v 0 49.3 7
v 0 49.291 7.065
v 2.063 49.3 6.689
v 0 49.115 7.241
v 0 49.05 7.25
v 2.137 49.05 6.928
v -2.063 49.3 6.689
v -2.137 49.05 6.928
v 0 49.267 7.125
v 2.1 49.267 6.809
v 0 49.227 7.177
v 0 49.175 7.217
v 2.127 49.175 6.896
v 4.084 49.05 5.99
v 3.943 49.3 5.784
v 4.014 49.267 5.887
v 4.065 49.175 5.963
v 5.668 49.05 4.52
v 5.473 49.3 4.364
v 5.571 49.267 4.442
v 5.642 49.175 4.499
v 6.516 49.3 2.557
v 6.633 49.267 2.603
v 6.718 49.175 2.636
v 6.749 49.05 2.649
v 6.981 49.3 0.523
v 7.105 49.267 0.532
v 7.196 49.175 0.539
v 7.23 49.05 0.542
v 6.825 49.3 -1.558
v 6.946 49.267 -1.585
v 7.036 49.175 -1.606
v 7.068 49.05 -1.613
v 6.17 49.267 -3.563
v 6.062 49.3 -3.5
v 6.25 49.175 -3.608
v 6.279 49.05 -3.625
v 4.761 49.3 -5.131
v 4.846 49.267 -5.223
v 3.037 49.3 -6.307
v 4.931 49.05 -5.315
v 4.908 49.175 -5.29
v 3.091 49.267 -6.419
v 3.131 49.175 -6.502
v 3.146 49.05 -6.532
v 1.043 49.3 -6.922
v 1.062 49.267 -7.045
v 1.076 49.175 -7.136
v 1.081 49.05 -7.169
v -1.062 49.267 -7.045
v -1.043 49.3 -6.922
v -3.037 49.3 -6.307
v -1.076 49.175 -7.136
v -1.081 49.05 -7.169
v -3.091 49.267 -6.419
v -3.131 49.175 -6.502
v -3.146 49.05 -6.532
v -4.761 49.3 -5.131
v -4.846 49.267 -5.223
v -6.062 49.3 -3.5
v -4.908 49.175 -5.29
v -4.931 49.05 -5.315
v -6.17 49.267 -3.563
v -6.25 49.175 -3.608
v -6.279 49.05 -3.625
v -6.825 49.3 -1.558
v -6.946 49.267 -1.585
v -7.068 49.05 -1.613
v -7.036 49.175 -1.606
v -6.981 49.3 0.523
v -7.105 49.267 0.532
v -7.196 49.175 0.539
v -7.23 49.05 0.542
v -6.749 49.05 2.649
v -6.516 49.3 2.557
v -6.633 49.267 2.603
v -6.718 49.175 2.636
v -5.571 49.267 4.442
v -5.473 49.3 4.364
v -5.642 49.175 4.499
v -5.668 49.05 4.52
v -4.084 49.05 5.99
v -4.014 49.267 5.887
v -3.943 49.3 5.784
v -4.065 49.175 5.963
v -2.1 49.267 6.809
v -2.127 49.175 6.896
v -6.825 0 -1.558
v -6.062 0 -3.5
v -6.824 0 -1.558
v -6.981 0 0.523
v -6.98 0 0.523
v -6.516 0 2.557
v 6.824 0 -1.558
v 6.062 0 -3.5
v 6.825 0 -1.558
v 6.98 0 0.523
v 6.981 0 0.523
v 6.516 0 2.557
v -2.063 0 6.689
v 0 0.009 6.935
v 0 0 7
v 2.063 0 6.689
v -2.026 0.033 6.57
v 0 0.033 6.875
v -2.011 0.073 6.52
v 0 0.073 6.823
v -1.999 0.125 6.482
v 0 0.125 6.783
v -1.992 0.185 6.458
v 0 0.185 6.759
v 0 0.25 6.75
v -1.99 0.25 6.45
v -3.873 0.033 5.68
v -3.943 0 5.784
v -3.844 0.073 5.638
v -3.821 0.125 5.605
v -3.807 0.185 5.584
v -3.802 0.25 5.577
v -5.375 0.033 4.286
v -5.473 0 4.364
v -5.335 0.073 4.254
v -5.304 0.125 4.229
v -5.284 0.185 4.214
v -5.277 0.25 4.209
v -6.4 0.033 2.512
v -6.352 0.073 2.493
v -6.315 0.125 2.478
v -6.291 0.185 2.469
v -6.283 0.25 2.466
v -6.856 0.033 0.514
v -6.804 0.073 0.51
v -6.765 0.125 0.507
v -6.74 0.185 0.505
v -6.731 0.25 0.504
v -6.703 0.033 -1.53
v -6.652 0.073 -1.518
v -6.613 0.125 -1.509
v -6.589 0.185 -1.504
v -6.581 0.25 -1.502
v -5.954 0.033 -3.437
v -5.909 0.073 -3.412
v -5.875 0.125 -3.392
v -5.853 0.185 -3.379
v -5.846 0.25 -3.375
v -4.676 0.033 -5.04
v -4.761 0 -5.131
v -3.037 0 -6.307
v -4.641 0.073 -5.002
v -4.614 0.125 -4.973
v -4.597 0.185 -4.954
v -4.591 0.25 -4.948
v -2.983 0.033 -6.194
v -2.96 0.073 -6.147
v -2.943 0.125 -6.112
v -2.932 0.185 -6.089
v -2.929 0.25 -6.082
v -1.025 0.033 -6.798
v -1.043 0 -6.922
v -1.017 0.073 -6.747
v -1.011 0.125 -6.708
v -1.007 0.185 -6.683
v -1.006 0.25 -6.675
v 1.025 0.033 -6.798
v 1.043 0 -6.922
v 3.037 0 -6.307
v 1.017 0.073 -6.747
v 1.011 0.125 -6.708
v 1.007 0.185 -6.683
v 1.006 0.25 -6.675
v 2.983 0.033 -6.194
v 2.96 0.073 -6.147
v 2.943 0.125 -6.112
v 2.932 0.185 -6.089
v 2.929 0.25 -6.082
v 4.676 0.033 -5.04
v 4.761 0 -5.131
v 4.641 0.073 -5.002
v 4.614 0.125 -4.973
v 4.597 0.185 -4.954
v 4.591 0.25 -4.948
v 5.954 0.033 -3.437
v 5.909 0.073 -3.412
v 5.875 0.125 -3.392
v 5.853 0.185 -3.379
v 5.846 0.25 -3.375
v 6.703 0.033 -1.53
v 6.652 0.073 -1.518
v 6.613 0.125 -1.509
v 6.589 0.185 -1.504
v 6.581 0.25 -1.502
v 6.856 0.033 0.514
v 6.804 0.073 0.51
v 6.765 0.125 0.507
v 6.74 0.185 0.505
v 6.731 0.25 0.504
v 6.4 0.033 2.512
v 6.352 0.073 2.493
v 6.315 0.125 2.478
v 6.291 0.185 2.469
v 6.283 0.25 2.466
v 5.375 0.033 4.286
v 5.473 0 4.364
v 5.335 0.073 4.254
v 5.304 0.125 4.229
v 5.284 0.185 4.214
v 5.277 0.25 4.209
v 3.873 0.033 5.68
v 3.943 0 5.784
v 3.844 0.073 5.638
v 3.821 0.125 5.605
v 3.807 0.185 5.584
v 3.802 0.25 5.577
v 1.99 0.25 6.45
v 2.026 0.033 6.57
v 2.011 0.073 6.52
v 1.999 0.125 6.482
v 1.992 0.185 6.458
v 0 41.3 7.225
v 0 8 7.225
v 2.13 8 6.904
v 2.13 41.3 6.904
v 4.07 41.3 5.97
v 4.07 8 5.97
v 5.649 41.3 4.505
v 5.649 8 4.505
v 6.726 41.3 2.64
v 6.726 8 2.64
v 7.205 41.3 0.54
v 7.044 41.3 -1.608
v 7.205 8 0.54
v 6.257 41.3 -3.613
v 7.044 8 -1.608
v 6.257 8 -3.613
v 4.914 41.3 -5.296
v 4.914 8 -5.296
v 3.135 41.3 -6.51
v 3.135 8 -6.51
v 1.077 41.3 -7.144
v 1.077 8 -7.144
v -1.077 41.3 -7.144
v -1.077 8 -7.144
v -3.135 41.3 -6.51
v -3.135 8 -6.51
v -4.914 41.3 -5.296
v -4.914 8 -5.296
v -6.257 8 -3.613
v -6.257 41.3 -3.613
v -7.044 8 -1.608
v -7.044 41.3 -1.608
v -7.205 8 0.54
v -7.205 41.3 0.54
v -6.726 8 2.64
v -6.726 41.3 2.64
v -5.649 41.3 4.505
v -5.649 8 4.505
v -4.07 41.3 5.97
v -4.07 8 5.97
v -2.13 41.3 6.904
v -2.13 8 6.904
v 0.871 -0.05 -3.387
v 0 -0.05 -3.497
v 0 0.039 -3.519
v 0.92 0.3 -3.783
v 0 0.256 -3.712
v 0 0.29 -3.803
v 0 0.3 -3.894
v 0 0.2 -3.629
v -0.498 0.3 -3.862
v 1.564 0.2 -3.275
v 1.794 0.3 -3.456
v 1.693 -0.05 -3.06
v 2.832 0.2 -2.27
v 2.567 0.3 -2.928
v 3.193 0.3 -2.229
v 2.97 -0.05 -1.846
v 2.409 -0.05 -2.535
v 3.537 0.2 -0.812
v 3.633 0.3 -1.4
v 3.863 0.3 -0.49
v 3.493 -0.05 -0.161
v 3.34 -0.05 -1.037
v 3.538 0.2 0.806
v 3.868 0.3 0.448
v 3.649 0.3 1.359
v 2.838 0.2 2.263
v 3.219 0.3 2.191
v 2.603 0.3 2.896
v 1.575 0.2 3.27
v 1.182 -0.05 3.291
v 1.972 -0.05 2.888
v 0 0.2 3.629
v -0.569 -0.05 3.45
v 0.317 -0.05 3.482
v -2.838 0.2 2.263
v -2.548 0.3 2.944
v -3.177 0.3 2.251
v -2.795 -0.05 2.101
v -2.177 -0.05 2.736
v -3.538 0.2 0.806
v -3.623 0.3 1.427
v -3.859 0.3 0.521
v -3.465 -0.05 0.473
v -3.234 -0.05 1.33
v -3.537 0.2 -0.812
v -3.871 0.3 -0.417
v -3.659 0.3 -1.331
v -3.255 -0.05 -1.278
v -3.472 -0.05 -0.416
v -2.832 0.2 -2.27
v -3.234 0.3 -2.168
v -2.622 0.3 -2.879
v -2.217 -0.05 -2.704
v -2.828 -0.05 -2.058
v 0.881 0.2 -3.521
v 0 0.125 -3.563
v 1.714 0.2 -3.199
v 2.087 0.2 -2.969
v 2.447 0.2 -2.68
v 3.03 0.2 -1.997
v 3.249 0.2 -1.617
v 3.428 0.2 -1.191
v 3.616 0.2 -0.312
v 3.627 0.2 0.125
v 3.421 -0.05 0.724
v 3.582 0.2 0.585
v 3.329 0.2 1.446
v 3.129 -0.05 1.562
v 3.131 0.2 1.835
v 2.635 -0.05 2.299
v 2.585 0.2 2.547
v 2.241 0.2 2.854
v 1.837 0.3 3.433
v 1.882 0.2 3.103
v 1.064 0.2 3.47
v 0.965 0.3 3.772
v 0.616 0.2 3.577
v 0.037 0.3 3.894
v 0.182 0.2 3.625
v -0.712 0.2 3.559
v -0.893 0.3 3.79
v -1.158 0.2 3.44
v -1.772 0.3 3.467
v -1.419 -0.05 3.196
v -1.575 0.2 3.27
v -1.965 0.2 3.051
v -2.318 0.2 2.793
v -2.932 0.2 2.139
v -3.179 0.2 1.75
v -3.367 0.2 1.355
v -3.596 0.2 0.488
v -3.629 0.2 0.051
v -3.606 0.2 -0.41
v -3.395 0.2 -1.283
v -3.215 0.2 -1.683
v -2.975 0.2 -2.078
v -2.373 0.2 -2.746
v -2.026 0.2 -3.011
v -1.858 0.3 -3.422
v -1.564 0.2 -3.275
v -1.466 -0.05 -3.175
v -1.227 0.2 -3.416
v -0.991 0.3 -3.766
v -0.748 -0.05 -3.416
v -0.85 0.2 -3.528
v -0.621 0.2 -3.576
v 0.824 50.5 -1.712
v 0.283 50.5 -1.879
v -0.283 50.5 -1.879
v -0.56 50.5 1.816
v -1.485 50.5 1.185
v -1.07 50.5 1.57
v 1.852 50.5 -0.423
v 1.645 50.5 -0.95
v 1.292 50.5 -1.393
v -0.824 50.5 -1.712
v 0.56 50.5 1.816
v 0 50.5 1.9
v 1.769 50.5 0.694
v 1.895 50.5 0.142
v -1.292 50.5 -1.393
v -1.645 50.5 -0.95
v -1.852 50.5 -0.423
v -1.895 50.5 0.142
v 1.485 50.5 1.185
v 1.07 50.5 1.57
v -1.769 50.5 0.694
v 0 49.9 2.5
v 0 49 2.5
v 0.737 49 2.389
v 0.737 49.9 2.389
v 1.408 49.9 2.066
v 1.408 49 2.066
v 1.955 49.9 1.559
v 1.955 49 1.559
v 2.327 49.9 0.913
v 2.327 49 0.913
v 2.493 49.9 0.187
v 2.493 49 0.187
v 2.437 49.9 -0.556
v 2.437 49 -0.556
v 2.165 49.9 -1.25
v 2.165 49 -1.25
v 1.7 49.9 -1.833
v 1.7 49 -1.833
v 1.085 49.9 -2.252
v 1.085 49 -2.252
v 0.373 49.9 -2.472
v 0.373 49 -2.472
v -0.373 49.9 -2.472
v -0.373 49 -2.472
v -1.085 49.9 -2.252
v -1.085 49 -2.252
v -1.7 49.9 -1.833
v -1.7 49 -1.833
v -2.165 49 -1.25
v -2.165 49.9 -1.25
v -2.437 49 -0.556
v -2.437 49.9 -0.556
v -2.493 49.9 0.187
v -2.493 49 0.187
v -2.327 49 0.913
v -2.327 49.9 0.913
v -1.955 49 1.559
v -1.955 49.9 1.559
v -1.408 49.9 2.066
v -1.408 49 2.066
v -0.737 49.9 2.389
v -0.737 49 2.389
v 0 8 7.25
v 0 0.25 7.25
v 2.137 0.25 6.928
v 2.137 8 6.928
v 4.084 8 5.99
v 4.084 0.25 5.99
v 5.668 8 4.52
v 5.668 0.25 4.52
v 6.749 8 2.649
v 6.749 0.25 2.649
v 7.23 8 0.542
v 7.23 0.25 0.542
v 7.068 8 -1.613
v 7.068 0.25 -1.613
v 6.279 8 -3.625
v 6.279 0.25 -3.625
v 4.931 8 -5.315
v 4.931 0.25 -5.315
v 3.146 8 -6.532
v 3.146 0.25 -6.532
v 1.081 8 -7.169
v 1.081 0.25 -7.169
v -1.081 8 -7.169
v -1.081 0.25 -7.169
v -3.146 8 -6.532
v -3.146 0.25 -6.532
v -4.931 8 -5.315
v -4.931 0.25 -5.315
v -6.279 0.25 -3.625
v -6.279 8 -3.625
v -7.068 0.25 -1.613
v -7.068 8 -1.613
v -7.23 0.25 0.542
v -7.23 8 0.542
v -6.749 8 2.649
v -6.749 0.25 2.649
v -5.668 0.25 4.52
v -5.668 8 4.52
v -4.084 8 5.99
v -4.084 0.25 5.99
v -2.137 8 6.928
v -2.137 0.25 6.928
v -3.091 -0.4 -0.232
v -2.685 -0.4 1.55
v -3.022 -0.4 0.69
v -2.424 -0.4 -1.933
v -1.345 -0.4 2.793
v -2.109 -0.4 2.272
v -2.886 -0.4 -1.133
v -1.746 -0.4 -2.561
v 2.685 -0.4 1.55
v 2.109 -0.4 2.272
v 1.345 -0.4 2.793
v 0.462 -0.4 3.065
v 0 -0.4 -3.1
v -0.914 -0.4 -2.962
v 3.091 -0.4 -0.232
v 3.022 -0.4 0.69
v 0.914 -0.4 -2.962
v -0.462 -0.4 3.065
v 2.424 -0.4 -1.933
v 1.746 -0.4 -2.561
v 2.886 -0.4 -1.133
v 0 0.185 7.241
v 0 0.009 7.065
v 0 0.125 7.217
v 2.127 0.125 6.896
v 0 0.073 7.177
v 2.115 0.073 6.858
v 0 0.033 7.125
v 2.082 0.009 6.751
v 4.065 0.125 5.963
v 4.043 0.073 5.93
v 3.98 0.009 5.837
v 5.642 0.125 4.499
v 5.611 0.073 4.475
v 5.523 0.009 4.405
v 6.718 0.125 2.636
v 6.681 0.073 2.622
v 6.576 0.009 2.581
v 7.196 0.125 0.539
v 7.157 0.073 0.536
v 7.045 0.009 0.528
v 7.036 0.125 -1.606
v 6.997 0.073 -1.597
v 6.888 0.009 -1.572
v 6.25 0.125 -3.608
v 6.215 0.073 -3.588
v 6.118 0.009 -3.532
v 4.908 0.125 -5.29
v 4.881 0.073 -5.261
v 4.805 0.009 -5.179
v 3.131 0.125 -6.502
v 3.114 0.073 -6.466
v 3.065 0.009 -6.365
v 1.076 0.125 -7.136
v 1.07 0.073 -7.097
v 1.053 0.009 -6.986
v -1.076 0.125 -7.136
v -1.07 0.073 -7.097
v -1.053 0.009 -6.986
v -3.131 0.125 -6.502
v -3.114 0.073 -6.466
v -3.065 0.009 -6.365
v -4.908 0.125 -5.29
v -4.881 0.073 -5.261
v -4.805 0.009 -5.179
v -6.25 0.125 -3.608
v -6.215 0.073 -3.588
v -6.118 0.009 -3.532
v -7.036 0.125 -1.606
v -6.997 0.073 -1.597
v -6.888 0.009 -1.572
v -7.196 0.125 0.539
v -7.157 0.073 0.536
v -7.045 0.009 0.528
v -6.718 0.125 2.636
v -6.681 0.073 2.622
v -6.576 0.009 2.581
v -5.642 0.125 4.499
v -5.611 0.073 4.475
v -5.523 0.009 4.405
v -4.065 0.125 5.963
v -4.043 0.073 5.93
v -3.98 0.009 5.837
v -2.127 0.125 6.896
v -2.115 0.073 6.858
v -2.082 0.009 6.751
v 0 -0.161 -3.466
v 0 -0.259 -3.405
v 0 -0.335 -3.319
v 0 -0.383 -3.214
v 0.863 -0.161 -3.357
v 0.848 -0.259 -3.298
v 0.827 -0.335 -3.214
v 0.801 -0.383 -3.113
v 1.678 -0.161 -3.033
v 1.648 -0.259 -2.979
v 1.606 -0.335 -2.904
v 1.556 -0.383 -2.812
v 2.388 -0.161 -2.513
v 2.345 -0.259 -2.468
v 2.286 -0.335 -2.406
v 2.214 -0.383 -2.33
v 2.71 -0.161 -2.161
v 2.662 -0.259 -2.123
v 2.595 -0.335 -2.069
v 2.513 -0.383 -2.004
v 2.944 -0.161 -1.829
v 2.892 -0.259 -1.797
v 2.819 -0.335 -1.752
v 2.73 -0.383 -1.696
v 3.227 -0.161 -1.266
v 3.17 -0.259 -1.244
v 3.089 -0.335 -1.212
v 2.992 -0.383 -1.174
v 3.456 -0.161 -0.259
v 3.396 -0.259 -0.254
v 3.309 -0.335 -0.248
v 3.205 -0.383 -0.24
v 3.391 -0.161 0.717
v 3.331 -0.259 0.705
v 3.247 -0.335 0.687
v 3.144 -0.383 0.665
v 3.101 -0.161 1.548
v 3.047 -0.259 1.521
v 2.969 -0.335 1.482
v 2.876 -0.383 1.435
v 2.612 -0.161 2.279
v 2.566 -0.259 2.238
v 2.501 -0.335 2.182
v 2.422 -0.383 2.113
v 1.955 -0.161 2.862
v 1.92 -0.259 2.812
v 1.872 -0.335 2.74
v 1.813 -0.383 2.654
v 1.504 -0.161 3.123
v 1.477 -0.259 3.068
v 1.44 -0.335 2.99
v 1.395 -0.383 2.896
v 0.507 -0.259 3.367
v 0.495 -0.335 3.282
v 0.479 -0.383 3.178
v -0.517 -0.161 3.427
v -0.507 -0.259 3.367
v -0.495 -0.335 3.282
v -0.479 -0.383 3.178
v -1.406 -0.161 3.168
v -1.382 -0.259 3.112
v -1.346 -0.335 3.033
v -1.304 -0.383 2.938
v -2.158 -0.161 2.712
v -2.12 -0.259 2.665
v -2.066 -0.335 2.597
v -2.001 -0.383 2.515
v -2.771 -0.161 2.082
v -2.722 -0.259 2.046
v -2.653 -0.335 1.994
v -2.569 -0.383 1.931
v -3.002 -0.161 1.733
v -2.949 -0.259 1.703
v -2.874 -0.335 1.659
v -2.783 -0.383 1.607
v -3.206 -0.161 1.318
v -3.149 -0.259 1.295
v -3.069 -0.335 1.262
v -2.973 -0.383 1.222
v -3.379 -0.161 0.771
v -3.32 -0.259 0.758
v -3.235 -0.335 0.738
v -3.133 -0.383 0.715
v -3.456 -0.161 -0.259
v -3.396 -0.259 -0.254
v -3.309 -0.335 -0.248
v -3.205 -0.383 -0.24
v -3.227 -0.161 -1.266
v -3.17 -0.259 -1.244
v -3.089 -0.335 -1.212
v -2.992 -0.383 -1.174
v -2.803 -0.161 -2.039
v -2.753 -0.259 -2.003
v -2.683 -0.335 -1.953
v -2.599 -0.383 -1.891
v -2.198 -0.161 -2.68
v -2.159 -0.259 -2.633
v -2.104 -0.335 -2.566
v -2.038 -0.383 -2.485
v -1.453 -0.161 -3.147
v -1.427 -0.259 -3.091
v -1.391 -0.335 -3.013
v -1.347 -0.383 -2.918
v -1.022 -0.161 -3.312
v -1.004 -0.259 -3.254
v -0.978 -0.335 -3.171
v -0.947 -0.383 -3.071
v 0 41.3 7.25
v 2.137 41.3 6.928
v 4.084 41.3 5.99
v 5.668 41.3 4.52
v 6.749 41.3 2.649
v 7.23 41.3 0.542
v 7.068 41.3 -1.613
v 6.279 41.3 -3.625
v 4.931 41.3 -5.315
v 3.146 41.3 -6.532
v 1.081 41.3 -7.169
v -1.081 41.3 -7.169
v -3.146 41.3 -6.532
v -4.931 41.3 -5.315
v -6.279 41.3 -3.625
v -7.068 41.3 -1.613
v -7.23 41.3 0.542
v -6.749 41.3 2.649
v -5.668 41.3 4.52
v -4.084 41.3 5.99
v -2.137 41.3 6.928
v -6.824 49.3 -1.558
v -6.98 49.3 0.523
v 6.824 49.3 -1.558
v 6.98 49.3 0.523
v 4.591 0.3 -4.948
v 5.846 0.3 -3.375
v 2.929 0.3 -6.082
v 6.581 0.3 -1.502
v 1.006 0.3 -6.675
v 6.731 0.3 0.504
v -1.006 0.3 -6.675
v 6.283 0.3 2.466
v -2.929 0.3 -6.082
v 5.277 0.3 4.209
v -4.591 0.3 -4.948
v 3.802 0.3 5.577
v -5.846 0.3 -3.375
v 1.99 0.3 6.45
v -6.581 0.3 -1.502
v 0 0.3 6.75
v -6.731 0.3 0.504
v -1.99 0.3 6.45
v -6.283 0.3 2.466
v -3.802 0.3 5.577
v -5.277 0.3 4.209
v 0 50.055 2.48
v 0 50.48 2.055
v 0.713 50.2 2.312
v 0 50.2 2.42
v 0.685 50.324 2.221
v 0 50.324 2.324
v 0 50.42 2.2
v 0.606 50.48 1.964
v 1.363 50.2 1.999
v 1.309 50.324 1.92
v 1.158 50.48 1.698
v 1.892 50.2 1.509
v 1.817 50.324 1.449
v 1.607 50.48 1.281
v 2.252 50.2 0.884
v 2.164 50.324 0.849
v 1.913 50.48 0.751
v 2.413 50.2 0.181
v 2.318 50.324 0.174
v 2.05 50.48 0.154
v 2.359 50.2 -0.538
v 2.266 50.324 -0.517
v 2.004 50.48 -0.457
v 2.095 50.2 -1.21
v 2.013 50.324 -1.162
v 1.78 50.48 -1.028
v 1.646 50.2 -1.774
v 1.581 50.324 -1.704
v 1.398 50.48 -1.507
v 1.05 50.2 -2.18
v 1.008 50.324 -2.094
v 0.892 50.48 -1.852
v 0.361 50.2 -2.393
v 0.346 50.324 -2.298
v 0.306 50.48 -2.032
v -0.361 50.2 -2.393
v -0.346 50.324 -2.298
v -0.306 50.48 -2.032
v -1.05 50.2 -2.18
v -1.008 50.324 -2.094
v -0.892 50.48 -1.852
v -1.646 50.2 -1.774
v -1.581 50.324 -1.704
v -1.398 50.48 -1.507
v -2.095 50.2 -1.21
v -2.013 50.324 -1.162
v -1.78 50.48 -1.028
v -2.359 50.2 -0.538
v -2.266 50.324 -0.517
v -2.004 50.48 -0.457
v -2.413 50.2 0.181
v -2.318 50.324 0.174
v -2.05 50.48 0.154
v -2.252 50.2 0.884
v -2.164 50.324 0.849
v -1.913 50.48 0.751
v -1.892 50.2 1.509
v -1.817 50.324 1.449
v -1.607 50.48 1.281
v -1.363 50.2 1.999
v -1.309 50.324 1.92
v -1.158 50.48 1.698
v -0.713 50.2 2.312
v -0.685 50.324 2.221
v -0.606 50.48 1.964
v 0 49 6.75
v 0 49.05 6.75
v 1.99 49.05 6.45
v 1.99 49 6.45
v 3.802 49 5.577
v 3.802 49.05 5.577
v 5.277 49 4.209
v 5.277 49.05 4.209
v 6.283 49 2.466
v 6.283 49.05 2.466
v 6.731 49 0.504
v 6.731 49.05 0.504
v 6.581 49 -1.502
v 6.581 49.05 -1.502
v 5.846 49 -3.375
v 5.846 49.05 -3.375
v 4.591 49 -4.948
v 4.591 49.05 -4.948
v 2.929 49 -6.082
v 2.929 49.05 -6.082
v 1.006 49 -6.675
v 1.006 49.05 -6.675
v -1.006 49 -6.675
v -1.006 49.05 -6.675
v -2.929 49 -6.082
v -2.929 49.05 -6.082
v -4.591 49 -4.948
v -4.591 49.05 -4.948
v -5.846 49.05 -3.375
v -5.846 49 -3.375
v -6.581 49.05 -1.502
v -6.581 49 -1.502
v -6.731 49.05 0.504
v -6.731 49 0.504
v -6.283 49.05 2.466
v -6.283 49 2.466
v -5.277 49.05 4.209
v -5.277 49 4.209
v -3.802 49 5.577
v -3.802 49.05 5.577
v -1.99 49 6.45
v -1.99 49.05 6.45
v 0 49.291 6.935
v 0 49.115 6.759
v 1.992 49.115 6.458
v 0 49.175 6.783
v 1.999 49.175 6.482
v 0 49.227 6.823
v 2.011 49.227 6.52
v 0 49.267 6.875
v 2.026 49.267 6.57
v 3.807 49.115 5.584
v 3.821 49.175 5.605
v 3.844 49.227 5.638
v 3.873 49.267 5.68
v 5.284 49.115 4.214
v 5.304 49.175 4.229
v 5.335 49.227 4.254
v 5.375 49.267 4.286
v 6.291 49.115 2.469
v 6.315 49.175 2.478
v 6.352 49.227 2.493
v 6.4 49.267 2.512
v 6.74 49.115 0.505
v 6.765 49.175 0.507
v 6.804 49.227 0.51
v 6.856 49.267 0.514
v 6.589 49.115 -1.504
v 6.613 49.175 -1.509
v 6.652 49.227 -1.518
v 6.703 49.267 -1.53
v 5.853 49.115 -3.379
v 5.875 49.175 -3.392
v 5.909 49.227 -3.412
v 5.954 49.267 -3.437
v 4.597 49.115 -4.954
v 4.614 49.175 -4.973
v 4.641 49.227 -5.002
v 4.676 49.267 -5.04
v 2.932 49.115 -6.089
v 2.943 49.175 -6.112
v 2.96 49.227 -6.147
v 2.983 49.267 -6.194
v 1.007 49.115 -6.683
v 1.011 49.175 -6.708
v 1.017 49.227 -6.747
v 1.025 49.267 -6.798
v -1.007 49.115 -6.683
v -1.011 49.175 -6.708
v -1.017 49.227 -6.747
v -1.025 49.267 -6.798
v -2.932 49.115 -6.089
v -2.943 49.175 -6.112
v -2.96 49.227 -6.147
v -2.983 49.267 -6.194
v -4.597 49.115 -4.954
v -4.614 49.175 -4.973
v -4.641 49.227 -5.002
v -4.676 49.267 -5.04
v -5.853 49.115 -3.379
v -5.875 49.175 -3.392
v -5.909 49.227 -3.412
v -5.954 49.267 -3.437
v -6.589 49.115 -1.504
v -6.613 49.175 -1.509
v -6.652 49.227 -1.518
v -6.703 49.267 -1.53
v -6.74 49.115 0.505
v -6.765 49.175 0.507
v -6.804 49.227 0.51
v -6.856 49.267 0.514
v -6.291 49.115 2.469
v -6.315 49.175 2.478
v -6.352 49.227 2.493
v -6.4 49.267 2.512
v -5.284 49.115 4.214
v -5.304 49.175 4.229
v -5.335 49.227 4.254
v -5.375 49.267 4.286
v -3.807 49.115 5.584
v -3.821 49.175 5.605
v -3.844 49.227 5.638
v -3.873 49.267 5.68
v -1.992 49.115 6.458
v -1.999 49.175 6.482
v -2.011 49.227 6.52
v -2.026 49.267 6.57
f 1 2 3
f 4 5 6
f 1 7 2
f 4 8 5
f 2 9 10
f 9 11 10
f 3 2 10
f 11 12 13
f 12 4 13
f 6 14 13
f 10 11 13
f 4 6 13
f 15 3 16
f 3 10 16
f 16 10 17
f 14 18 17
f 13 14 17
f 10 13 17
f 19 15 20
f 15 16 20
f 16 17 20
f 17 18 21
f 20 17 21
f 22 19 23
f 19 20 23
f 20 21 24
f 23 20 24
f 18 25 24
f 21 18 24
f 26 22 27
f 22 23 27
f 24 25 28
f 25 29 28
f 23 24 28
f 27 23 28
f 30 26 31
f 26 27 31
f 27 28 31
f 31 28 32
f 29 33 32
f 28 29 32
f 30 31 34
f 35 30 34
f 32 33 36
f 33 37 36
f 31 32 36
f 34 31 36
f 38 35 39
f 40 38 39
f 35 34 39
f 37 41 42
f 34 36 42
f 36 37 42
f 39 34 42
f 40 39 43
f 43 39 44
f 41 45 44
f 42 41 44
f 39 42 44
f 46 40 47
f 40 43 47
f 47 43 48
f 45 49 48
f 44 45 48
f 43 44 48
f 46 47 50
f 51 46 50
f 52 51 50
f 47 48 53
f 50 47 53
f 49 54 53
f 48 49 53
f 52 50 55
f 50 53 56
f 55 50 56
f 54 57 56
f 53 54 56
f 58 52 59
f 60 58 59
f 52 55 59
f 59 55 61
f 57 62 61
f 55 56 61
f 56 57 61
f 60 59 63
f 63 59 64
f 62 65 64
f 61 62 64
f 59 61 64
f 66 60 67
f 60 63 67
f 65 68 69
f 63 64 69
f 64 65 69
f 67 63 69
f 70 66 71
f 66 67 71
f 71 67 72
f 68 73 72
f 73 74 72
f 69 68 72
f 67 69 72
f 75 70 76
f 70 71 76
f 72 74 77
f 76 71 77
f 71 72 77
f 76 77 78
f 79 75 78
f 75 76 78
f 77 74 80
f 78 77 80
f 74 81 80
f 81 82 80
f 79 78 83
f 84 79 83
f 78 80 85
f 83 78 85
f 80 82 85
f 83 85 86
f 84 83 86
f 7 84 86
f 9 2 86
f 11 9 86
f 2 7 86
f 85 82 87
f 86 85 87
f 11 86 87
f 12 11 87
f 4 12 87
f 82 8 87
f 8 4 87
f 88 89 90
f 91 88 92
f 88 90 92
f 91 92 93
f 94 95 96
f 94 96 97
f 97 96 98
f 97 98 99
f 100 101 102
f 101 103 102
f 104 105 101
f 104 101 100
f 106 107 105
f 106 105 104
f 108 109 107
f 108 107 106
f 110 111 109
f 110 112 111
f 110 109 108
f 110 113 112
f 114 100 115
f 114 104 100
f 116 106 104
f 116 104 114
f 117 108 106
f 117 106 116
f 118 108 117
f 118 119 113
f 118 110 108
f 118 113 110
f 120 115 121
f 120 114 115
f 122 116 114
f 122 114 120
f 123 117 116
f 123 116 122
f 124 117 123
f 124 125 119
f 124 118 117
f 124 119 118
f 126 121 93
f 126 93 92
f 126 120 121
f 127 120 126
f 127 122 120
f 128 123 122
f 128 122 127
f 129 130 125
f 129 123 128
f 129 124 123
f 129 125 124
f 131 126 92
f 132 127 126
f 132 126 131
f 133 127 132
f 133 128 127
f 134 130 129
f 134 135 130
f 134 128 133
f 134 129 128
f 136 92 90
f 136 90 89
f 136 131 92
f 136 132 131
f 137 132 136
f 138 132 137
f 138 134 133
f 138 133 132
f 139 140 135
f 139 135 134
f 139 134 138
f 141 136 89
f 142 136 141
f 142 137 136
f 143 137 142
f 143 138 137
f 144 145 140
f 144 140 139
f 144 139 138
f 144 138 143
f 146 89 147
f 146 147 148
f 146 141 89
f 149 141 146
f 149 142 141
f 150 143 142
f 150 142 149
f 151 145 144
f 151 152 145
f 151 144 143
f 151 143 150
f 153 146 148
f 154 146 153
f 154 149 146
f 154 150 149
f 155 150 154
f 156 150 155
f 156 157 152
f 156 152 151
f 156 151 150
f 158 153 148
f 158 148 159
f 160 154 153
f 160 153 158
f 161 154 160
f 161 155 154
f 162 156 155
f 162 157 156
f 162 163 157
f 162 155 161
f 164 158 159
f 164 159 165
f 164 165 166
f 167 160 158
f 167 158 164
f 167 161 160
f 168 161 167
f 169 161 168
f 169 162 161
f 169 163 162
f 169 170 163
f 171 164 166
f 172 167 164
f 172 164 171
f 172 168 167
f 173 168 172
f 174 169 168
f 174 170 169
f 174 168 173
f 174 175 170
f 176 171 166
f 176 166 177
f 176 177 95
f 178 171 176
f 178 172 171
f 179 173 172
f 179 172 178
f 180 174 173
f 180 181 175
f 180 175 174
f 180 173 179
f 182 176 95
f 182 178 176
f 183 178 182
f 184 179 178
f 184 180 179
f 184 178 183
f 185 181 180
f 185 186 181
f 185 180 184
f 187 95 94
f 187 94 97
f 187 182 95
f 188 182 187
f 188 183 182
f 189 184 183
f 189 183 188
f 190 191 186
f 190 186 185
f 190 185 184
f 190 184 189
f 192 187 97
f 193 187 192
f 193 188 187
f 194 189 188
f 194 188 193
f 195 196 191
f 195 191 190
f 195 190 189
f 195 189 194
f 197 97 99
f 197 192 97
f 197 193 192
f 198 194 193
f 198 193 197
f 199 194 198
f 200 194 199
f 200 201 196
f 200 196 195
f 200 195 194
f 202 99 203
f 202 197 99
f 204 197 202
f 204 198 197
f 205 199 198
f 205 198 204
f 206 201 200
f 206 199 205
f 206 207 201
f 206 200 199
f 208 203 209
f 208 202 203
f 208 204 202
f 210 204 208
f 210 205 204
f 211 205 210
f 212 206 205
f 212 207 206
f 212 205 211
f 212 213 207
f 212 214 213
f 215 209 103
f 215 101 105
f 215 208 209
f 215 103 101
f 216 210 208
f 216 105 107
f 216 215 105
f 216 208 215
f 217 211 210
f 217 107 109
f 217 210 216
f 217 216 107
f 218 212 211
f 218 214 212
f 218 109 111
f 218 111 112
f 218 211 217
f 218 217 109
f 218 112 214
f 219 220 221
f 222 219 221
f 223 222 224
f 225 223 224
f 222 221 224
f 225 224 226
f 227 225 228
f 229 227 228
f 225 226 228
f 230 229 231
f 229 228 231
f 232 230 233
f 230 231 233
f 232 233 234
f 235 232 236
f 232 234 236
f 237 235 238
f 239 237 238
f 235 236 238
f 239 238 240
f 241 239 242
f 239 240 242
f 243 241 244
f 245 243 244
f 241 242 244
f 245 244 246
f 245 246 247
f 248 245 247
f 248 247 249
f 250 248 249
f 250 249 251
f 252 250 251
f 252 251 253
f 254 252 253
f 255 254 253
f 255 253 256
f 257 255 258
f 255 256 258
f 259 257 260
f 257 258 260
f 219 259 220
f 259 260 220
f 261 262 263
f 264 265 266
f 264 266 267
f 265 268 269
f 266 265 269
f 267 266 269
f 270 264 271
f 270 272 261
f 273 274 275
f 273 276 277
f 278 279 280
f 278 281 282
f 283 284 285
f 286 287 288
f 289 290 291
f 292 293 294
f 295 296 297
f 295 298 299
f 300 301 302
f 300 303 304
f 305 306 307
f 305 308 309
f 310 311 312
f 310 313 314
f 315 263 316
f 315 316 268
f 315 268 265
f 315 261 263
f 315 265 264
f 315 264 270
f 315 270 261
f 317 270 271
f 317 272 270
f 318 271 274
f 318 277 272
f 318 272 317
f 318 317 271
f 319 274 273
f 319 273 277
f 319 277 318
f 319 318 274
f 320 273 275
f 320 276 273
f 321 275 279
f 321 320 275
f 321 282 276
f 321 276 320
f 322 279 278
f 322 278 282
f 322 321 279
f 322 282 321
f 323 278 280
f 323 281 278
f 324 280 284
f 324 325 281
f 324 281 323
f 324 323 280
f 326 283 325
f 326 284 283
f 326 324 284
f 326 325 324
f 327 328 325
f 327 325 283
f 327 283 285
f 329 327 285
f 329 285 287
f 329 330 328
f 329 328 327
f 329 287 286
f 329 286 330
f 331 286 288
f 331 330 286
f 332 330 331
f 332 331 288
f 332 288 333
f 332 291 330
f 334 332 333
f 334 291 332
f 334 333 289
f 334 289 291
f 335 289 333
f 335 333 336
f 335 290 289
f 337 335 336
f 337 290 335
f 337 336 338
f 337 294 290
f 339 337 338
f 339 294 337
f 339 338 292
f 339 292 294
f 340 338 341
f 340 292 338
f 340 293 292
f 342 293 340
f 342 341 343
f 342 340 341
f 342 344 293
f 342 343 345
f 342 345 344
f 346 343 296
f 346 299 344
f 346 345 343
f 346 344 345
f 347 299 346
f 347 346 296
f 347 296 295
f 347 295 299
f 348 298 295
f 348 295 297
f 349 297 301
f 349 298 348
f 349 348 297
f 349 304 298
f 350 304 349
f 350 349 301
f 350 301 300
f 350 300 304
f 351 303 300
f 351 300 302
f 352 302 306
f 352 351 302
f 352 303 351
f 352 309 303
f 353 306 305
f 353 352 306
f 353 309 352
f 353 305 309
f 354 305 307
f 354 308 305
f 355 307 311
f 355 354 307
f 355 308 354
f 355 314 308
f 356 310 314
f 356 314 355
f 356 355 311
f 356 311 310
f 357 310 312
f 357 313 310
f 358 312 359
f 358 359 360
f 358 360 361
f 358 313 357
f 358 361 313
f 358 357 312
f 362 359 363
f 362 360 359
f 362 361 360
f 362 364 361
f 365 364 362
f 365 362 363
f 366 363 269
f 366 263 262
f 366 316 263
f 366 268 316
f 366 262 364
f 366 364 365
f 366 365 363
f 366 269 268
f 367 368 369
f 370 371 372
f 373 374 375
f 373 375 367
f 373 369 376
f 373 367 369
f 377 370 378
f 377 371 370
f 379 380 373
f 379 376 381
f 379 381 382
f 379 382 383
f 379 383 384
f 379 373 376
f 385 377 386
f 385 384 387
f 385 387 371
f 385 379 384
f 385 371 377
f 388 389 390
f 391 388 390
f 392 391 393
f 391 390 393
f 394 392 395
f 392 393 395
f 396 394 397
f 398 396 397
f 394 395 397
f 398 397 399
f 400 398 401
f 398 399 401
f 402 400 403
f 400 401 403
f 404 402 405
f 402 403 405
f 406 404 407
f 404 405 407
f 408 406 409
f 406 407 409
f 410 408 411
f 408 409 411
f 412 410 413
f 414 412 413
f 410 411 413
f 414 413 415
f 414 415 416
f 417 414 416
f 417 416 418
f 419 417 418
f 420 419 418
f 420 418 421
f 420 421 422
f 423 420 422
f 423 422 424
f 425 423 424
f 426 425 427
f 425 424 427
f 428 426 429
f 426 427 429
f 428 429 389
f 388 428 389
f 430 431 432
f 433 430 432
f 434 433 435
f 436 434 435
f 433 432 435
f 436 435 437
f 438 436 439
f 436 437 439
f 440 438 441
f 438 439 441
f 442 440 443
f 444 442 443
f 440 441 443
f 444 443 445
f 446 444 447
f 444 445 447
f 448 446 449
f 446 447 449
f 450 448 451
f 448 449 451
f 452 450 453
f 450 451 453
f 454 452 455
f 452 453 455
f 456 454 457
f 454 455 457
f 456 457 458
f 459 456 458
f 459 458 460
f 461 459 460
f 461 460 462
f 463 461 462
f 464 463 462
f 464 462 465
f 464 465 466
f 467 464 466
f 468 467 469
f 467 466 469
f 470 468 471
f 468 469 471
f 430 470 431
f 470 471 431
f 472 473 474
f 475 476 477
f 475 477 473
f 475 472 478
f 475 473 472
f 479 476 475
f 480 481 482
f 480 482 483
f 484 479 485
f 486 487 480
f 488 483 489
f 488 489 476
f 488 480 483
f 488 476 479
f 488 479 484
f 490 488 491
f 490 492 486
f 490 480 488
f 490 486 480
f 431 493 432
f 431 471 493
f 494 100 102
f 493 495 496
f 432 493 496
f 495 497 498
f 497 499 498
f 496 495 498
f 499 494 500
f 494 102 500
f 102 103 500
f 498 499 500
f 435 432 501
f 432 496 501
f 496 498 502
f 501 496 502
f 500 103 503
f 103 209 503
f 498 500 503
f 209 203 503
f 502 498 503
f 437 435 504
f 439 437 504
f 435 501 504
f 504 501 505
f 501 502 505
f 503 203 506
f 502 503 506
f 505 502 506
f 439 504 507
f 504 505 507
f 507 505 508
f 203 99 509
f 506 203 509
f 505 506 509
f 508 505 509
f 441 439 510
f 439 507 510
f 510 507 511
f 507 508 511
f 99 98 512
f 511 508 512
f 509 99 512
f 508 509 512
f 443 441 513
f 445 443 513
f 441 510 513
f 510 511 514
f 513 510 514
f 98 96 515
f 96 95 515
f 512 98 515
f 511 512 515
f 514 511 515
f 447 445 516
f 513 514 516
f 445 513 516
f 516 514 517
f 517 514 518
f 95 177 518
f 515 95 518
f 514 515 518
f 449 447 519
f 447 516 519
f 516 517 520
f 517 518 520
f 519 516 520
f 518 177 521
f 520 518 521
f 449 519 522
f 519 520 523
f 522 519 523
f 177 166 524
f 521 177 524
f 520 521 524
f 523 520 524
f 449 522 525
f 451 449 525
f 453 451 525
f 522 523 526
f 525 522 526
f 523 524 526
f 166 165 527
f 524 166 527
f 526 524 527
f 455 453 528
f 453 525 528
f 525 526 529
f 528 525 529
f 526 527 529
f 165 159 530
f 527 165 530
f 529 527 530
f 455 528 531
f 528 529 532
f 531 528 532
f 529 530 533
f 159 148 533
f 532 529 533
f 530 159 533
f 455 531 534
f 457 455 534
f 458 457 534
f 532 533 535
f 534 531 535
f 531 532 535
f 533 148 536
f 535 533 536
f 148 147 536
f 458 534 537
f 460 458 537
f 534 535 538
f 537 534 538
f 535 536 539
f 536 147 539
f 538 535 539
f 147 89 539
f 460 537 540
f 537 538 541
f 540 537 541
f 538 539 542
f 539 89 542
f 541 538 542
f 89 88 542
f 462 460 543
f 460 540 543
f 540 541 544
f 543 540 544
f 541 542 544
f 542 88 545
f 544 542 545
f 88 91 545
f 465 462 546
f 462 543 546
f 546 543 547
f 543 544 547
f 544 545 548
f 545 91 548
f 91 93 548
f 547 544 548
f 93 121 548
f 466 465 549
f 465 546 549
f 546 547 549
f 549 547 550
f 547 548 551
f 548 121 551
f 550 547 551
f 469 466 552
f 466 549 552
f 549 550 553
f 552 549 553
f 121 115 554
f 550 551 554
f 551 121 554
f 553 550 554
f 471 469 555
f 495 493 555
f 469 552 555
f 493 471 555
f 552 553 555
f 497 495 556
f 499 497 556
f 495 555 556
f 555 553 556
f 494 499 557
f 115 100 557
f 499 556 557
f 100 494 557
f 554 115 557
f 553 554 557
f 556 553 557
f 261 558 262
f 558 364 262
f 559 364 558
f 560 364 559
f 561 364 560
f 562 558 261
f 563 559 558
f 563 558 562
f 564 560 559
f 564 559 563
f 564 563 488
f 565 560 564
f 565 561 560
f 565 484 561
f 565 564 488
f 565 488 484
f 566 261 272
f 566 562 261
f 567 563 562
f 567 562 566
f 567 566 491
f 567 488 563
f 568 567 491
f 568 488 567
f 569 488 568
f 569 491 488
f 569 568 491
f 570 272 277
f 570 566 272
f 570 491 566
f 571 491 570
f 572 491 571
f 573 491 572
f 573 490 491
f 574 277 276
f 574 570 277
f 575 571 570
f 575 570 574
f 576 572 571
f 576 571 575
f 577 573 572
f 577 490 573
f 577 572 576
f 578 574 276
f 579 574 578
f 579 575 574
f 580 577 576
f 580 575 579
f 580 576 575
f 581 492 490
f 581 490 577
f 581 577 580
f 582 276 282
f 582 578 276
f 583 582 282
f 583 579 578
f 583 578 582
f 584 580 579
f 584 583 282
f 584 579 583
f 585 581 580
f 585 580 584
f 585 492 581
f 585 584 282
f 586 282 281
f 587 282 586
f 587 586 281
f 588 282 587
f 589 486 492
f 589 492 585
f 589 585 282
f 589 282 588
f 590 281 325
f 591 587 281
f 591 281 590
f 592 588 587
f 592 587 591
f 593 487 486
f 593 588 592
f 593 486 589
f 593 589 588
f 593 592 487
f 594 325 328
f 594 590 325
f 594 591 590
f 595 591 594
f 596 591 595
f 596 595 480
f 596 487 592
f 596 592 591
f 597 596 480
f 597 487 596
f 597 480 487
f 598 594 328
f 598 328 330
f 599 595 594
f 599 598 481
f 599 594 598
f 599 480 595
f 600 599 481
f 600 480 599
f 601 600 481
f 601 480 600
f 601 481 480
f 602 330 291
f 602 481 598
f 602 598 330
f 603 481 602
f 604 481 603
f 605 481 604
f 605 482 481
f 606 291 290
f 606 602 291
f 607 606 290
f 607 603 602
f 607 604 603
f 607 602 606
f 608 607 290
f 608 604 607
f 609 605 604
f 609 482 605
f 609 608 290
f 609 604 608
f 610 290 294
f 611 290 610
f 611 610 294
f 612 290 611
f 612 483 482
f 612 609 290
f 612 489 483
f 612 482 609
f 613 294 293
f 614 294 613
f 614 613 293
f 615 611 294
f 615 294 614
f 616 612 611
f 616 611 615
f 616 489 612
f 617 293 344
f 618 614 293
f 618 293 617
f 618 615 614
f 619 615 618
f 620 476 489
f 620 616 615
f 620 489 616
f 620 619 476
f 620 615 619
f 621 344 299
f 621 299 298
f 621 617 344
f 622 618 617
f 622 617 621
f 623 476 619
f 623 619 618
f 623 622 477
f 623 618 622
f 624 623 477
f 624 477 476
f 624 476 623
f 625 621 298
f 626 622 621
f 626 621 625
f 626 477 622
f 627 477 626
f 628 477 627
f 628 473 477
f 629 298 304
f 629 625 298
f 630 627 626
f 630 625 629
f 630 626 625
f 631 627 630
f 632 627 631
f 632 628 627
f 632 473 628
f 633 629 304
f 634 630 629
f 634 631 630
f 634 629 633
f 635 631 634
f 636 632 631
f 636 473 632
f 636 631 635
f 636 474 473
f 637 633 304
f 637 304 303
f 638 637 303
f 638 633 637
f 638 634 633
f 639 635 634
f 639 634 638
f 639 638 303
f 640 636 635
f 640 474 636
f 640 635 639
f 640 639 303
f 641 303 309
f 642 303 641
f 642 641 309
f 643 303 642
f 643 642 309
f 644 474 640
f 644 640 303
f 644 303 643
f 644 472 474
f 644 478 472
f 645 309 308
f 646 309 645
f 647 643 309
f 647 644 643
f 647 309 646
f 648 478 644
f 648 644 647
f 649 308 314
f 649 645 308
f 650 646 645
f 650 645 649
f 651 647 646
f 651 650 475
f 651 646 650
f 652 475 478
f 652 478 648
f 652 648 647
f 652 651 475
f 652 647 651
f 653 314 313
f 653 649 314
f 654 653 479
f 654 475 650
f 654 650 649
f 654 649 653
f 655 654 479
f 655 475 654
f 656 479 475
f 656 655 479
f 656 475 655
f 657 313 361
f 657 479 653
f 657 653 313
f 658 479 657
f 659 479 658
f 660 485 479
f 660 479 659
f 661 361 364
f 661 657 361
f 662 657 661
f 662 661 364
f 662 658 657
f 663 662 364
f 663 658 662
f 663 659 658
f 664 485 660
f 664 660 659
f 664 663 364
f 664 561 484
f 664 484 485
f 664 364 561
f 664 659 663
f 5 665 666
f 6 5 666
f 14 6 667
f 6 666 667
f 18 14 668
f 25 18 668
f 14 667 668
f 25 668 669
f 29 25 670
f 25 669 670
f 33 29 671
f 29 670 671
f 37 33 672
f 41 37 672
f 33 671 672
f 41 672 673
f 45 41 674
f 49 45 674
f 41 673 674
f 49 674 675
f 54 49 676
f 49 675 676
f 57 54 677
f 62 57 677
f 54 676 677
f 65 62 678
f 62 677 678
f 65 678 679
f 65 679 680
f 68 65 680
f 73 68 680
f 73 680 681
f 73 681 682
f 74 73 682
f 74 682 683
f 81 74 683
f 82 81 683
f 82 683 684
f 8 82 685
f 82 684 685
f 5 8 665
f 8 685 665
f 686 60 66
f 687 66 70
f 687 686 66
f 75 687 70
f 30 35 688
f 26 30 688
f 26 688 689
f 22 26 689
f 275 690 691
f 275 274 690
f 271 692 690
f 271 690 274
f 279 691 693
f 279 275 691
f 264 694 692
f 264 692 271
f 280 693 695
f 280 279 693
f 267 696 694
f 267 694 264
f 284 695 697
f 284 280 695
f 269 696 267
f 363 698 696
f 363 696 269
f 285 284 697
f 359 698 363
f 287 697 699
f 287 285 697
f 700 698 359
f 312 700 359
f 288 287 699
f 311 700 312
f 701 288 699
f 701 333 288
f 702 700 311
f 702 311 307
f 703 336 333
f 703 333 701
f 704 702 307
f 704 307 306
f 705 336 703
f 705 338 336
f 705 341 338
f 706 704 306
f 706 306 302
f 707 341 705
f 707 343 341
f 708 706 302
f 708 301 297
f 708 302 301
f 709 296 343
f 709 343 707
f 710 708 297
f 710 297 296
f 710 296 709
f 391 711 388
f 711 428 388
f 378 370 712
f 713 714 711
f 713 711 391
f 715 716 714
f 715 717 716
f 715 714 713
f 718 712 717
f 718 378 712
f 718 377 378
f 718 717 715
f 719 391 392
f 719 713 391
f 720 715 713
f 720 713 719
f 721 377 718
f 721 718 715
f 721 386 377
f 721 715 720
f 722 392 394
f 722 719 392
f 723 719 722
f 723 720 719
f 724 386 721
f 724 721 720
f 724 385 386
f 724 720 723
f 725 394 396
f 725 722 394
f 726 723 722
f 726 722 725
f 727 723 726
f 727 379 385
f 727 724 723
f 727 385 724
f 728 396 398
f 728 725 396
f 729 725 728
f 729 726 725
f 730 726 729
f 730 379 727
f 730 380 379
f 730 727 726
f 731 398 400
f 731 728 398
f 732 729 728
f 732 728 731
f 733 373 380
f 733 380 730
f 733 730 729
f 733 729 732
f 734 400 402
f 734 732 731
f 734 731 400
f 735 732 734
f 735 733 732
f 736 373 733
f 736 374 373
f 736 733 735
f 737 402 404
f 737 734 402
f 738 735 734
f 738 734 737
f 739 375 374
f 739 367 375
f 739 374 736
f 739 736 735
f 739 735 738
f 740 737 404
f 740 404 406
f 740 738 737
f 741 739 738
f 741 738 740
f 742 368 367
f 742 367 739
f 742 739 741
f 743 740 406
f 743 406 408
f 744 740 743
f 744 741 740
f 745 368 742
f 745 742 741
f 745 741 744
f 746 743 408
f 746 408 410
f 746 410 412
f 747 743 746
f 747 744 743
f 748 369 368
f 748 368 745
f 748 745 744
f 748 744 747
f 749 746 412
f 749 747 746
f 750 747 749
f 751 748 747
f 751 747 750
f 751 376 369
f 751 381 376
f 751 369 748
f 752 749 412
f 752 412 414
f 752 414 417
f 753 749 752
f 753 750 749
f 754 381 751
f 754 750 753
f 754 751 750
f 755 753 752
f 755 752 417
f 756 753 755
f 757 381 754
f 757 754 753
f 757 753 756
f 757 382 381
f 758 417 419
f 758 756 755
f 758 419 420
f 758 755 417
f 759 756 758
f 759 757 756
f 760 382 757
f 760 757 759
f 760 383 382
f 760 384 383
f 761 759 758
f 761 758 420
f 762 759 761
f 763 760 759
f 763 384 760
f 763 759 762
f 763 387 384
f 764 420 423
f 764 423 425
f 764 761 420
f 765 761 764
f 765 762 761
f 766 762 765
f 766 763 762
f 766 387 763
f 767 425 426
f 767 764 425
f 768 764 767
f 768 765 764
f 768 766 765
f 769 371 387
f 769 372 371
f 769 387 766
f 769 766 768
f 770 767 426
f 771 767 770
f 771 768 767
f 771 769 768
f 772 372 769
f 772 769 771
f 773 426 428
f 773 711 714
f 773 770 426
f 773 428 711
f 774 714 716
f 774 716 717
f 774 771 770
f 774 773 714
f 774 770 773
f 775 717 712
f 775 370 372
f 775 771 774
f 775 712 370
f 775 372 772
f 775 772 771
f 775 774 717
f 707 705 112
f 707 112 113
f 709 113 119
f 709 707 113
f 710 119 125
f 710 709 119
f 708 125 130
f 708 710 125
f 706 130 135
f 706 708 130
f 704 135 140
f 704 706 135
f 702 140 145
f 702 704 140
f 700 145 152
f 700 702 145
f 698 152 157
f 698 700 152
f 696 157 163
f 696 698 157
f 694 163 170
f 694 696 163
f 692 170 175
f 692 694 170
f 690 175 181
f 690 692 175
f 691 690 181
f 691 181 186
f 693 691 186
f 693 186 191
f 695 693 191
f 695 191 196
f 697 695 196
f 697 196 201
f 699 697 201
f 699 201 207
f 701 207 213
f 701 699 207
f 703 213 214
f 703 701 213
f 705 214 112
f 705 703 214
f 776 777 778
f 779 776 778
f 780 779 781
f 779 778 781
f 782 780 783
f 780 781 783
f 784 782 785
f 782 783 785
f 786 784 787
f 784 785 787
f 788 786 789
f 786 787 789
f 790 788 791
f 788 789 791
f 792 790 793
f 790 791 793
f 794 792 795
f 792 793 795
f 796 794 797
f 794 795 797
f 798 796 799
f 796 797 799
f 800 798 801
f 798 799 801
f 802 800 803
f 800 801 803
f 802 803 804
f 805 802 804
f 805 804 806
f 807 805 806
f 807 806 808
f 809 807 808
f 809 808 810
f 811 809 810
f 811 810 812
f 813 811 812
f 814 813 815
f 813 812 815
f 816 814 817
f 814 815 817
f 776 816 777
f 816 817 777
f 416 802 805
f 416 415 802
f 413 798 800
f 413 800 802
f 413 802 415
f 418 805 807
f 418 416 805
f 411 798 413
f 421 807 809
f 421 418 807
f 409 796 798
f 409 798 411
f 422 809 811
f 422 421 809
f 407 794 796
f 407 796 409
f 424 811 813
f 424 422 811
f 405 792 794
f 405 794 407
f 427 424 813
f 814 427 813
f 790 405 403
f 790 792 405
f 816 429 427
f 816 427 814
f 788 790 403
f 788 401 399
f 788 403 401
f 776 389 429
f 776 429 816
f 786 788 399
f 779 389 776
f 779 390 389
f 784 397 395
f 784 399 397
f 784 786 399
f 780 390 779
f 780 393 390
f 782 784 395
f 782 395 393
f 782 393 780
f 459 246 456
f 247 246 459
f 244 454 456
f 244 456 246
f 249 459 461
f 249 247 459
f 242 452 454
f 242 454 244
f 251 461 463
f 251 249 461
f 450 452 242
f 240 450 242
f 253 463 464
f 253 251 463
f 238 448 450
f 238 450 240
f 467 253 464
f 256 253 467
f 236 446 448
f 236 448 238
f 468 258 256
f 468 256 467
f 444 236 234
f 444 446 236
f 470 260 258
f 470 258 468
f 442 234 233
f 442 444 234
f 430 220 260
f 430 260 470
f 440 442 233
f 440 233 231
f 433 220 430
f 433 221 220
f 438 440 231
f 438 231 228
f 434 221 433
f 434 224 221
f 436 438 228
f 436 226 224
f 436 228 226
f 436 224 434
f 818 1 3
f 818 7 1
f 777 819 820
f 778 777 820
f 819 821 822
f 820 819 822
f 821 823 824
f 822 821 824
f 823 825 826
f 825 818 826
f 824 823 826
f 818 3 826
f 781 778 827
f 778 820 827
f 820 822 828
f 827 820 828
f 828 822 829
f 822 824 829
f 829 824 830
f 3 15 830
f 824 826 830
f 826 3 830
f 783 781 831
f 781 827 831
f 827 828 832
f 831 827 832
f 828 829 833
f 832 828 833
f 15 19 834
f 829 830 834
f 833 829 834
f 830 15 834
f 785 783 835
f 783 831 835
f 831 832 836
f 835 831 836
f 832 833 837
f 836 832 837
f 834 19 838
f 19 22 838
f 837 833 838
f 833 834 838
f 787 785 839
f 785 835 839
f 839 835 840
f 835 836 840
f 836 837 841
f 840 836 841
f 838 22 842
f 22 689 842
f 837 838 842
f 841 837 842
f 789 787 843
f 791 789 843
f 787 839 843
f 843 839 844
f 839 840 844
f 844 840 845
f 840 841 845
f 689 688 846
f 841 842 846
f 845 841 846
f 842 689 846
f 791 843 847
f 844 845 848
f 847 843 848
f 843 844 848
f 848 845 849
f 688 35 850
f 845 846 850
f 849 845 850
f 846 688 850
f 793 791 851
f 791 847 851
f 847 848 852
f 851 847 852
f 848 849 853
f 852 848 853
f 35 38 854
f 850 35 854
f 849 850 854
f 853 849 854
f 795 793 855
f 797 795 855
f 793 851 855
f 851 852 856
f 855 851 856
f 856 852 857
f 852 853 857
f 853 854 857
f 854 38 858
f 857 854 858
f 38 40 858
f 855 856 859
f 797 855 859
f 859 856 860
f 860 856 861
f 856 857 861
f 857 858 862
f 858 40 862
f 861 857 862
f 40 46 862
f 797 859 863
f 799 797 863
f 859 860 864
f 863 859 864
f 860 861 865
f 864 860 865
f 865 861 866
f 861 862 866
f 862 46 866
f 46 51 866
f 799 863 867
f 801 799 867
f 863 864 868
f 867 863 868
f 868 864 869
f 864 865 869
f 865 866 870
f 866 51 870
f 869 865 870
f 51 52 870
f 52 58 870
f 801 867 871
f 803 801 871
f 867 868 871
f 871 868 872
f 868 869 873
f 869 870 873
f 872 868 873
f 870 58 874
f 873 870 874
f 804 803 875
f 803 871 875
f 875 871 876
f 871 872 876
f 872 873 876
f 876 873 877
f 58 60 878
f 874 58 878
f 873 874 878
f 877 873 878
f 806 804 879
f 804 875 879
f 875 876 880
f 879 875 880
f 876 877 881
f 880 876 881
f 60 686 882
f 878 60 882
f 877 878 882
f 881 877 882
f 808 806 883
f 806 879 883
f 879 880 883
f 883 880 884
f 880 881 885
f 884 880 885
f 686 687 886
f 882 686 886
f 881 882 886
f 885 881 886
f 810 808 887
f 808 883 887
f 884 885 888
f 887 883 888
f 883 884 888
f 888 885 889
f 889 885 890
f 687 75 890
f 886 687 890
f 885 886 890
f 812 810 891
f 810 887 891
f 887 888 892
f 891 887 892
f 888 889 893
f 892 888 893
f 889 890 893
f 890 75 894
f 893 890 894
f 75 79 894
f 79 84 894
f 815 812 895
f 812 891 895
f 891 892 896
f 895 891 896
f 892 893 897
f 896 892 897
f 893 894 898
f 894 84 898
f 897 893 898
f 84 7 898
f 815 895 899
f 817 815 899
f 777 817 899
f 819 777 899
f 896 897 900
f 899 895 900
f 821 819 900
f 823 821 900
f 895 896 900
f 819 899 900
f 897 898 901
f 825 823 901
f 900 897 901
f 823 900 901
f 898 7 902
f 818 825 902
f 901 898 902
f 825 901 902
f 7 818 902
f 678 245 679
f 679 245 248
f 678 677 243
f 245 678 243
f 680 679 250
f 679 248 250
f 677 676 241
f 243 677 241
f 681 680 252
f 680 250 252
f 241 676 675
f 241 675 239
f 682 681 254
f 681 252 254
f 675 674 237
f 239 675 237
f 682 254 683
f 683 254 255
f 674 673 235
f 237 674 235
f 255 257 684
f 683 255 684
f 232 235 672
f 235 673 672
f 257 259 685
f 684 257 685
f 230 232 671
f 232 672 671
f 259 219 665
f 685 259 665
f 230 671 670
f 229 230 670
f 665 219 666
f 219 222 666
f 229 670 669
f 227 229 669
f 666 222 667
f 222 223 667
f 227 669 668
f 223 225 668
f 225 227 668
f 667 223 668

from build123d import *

# Parameters (mm, degrees)
SKETCH1_R           = 7.25
BOSS_EXTRUDE1_DEPTH = 8
SKETCH2_R           = 7.225
BOSS_EXTRUDE2_DEPTH = 33.3
SKETCH3_R           = 7.25
BOSS_EXTRUDE3_DEPTH = 8
SKETCH4_R           = 6.75
CUT_EXTRUDE1_DEPTH  = 0.3
SKETCH5_R           = 2.5
BOSS_EXTRUDE4_DEPTH = 1.5
CUT_EXTRUDE2_START  = -0.3
SKETCH6_R           = 6.75
CUT_EXTRUDE2_DEPTH  = 0.3
SKETCH7_R           = 3.5
BOSS_EXTRUDE5_DEPTH = 0.7
FILLET1_R           = 0.6
FILLET3_R           = 0.25
FILLET4_R           = 0.4
FILLET5_R           = 0.4


with BuildPart() as part:
    # Sketch1 → Boss-Extrude1 (new body)
    with BuildSketch(Plane(origin=(0, 0, 0), x_dir=(1, 0, 0), z_dir=(0, 1, 0))):
        with Locations(Location((0, 0, 0), (0, 0, 270))):
            Circle(SKETCH1_R)
    extrude(amount=BOSS_EXTRUDE1_DEPTH)

    # Sketch2 → Boss-Extrude2 (add)
    with BuildSketch(Plane(origin=(0, 8, 0), x_dir=(1, 0, 0), z_dir=(0, 1, 0))):
        with Locations(Location((0, 0, 0), (0, 0, 270))):
            Circle(SKETCH2_R)
    extrude(amount=BOSS_EXTRUDE2_DEPTH)

    # Sketch3 → Boss-Extrude3 (add)
    with BuildSketch(Plane(origin=(0, 41.3, 0), x_dir=(1, 0, 0), z_dir=(0, 1, 0))):
        with Locations(Location((0, 0, 0), (0, 0, 270))):
            Circle(SKETCH3_R)
    extrude(amount=BOSS_EXTRUDE3_DEPTH)

    # Sketch4 → Cut-Extrude1 (cut)
    with BuildSketch(Plane(origin=(0, 49.3, 0), x_dir=(1, 0, 0), z_dir=(0, 1, 0))):
        with Locations(Location((0, 0, 0), (0, 0, 270))):
            Circle(SKETCH4_R)
    extrude(amount=-CUT_EXTRUDE1_DEPTH, mode=Mode.SUBTRACT)

    # Sketch5 → Boss-Extrude4 (add)
    with BuildSketch(Plane(origin=(0, 49, 0), x_dir=(1, 0, 0), z_dir=(0, 1, 0))):
        with Locations(Location((0, 0, 0), (0, 0, 270))):
            Circle(SKETCH5_R)
    extrude(amount=BOSS_EXTRUDE4_DEPTH)

    # Sketch6 → Cut-Extrude2 (cut)
    with BuildSketch(Plane.XZ.offset(CUT_EXTRUDE2_START)):
        with Locations(Location((0, 0, 0), (0, 0, 90))):
            Circle(SKETCH6_R)
    extrude(amount=CUT_EXTRUDE2_DEPTH, mode=Mode.SUBTRACT)

    # Sketch7 → Boss-Extrude5 (add)
    with BuildSketch(Plane.XZ.offset(-0.3)):
        with Locations(Location((0, 0, 0), (0, 0, 270))):
            Circle(SKETCH7_R)
    extrude(amount=BOSS_EXTRUDE5_DEPTH)

    # Fillet1
    fillet1_edges = [part.edges().sort_by_distance(p)[0] for p in [
        (0, 50.5, -2.5),
    ]]
    fillet(fillet1_edges, radius=FILLET1_R)

    # Fillet3
    fillet3_edges = [part.edges().sort_by_distance(p)[0] for p in [
        (0, 49.3, -6.75),
        (0, 0, -7.25),
        (0, 0, -6.75),
        (0, 49.3, -7.25),
    ]]
    fillet(fillet3_edges, radius=FILLET3_R - 0.0001)  # a hair under: the kernel refuses the full size

    # Fillet4
    fillet4_edges = [part.edges().sort_by_distance(p)[0] for p in [
        (0, -0.4, 3.5),
    ]]
    fillet(fillet4_edges, radius=FILLET4_R)

    # Fillet5
    fillet5_edges = [part.edges().sort_by_distance(p)[0] for p in [
        (0, 0.3, 3.5),
    ]]
    fillet(fillet5_edges, radius=FILLET5_R)


solid = part.part
